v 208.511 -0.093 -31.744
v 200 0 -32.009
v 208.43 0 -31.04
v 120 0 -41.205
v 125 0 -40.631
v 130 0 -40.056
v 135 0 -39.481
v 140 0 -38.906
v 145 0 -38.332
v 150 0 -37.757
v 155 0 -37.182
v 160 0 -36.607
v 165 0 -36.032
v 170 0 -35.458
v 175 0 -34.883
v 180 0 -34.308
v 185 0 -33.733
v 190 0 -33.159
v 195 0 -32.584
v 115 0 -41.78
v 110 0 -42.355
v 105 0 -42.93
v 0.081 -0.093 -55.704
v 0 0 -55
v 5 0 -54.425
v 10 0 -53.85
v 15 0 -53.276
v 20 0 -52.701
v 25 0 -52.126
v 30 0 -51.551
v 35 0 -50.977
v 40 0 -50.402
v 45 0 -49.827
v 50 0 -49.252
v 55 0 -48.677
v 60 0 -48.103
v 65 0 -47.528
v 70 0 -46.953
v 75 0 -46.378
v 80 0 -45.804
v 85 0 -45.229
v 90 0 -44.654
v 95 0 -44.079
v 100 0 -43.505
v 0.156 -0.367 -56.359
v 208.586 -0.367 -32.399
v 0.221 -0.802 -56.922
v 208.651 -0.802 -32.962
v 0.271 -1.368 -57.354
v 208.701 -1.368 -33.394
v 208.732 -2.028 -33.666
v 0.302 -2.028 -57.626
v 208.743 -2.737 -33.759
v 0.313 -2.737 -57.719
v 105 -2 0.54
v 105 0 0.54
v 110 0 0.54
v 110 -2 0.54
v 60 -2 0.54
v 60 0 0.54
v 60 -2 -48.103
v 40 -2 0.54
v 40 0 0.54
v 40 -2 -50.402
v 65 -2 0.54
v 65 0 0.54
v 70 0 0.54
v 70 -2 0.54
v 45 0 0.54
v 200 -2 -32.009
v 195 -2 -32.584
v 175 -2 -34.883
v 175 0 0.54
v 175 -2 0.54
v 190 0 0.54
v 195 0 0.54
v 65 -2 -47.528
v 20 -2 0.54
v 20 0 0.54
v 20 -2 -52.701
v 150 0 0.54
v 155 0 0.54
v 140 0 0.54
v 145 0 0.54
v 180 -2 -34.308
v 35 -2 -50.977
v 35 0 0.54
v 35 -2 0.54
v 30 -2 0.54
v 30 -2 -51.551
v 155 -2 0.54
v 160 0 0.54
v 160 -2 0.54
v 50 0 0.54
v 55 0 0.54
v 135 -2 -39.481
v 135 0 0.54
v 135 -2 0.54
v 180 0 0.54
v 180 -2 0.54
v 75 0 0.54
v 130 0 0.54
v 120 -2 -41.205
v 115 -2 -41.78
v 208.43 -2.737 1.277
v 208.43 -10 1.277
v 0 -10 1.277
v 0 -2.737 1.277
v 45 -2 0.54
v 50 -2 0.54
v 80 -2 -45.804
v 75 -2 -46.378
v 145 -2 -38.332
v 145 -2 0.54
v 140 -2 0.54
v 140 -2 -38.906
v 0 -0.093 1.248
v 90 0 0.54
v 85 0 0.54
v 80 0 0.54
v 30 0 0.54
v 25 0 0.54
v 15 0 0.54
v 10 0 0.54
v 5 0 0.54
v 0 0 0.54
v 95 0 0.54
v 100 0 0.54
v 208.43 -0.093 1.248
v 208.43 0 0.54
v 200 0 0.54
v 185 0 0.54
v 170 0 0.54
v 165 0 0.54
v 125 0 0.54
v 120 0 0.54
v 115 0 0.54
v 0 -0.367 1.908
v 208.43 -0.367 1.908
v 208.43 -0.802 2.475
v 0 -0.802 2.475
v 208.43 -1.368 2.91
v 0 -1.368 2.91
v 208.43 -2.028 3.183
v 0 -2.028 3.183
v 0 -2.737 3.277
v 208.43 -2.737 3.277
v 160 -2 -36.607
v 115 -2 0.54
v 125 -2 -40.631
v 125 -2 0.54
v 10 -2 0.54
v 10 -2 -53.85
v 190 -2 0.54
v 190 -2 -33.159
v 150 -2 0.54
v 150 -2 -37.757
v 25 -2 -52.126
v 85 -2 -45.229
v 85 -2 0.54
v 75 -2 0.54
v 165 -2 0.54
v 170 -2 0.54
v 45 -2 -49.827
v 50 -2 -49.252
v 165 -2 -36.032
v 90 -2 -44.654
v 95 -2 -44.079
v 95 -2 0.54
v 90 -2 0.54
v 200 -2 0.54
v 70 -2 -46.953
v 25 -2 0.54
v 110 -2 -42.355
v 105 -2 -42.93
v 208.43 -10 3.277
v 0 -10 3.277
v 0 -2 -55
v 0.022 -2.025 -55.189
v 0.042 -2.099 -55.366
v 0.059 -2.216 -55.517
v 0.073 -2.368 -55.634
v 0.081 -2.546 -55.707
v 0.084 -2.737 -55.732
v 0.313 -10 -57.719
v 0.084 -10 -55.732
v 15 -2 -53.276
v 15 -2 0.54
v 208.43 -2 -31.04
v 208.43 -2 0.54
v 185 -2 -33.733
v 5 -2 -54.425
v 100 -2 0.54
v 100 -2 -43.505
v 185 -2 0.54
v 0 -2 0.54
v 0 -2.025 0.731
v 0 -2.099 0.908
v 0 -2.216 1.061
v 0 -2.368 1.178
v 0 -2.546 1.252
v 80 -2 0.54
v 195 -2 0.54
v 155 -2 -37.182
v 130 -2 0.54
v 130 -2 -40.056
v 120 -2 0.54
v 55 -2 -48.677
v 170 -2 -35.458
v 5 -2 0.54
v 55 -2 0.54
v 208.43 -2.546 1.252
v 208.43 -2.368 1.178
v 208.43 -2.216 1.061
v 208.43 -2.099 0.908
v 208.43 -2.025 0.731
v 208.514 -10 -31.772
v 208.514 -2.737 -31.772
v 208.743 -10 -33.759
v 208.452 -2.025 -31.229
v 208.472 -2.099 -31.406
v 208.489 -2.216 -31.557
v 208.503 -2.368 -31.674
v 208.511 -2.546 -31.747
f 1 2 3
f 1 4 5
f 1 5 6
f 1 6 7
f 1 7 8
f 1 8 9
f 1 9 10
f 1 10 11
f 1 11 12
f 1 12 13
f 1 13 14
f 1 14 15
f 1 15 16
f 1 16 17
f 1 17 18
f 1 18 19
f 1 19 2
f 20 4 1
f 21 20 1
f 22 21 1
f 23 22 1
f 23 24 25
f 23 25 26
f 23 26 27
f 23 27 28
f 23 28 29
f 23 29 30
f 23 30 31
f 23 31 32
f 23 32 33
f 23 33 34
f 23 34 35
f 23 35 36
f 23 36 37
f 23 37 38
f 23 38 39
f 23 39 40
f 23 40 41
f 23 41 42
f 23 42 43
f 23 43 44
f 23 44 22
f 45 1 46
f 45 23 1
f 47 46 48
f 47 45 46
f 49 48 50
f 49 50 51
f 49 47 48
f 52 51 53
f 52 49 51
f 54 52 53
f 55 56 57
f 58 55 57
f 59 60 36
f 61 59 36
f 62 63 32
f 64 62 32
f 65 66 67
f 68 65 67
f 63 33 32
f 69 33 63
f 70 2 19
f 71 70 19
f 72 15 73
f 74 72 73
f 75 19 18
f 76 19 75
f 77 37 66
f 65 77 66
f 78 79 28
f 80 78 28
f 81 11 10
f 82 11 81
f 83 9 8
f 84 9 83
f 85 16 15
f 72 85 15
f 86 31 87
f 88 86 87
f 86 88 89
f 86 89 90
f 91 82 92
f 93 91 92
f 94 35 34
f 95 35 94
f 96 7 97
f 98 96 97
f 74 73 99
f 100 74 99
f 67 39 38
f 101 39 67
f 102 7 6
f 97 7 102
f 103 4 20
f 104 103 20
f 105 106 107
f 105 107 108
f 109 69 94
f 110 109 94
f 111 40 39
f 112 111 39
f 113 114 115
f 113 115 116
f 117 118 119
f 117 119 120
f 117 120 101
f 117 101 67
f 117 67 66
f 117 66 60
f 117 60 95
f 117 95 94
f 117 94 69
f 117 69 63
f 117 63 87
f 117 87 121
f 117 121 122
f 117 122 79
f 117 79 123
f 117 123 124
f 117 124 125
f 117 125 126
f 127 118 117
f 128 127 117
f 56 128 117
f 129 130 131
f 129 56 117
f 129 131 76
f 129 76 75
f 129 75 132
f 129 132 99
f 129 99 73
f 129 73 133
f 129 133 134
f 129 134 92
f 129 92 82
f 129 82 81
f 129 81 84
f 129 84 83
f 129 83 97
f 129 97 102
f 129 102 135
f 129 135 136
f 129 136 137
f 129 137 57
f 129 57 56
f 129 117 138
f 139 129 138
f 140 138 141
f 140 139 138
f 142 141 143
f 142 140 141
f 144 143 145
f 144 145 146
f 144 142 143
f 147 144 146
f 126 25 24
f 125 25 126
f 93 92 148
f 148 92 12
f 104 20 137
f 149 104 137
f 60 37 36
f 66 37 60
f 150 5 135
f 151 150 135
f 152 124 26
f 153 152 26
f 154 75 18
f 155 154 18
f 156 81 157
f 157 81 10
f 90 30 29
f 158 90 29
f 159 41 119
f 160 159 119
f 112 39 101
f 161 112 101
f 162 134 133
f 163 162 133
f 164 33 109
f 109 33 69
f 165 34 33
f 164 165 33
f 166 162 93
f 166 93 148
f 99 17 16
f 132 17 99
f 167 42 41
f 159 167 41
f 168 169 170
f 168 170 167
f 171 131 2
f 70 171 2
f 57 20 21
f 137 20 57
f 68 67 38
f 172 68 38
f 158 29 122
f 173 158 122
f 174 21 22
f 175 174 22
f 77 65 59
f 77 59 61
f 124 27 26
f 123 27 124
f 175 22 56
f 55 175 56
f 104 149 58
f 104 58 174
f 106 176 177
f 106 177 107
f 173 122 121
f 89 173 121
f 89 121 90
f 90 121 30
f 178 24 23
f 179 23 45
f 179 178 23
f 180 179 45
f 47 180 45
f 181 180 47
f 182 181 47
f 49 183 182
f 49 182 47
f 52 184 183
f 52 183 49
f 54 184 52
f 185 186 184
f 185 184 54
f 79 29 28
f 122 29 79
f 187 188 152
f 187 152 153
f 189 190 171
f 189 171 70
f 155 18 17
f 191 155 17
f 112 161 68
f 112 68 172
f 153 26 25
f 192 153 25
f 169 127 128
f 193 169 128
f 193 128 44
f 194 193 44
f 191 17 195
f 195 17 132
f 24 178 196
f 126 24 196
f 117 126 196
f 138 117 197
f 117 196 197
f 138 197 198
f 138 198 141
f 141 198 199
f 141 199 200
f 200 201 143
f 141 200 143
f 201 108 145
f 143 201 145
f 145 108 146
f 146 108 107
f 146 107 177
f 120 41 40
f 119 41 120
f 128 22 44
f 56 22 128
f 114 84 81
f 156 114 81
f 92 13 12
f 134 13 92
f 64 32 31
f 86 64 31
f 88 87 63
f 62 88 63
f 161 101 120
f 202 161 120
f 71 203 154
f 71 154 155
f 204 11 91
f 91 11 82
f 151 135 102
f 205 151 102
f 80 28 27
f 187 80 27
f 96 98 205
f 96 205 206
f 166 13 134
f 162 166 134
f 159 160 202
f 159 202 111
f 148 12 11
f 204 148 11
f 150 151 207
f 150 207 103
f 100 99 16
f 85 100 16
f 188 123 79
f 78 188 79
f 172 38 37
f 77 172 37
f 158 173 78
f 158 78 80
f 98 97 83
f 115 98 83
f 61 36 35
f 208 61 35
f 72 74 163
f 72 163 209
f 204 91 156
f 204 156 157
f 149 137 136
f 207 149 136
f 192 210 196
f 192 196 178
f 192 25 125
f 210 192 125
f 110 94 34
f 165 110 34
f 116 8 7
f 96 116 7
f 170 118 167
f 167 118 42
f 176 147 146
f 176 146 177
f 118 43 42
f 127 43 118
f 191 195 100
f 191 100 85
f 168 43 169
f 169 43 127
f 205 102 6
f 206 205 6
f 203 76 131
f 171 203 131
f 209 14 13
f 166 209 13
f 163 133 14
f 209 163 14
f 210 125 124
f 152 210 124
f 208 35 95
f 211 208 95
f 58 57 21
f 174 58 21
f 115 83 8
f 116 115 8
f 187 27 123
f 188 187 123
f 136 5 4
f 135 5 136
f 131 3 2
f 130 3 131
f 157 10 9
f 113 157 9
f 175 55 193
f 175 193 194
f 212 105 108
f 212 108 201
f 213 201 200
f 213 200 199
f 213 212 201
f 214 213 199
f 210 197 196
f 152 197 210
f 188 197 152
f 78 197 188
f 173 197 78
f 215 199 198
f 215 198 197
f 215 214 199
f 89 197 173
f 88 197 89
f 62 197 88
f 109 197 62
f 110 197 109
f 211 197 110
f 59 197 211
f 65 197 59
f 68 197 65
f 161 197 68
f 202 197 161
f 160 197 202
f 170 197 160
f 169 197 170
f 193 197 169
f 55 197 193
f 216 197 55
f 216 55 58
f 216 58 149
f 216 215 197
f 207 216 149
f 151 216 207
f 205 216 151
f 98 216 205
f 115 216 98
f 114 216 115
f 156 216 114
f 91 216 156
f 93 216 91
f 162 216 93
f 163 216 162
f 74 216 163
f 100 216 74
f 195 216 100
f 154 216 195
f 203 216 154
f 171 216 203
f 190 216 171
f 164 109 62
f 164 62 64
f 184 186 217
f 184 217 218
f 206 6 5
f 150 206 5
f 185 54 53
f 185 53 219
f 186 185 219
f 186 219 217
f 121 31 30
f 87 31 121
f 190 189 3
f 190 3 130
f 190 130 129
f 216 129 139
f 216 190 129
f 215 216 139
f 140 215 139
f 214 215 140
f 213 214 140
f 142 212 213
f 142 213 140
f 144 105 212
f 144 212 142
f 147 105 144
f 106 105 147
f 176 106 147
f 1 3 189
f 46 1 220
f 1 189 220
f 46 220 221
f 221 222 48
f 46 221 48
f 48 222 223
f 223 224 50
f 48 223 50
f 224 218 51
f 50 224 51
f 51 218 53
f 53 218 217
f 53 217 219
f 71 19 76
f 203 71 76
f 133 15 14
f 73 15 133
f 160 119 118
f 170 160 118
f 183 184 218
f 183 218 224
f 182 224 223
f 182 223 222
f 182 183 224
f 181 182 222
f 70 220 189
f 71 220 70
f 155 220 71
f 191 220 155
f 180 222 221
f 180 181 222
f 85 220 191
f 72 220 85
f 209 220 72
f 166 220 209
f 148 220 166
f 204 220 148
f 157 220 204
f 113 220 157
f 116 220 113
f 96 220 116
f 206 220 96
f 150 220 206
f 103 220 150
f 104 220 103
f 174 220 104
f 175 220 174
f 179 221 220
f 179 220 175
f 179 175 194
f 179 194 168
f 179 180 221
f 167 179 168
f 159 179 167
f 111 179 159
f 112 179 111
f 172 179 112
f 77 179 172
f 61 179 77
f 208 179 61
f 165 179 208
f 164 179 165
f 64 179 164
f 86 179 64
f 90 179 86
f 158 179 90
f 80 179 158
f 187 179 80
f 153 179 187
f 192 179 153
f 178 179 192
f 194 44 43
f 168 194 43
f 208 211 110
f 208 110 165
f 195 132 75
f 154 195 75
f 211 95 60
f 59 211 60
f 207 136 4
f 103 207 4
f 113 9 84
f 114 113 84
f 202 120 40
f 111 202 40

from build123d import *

# Parameters (mm, degrees)
BASE_FLANGE1_DEPTH = 2
EDGE_FLANGE1_DEPTH = 209.802637019
EDGE_FLANGE2_DEPTH = 208.43
CUT_EXTRUDE1_DEPTH = 10
CUT_EXTRUDE2_DEPTH = 10
CUT_EXTRUDE3_DEPTH = 10
CUT_EXTRUDE4_DEPTH = 10


# Sheet-metal steps are written as plain solids
with BuildPart() as part:
    # Sketch1 → Base-Flange1 (new body)
    with BuildSketch(Plane(origin=(0, 0, 0), x_dir=(1, 0, 0), z_dir=(0, 1, 0))):
        Polygon((0, 0), (208.43, 0), (208.43, 31.04), (0, 55), align=None)
    extrude(amount=-BASE_FLANGE1_DEPTH)

    # Edge-Flange1 section (across the edge) → Edge-Flange1 (add)
    with BuildSketch(Plane(origin=(0.084121612, -2, -55.731780783), x_dir=(-0.1142025683779395, -3.4914813388431334e-15, 0.9934574844329687), z_dir=(0.9934574844329687, 0, 0.1142025683779395))):
        with BuildLine():
            Line((-2, 0.7366), (-2, 8))
            Line((-2, 8), (0, 8))
            Line((0, 8), (0, 0.7366))
            ThreePointArc((0, 0.7366), (0.215745145, 0.215745145), (0.7366, 0))
            Line((0.7366, 0), (0.7366, -2))
            ThreePointArc((0.7366, -2), (-1.198468417, -1.198468417), (-2, 0.7366))
        make_face()
    extrude(amount=EDGE_FLANGE1_DEPTH)

    # Edge-Flange2 section (across the edge) → Edge-Flange2 (add)
    with BuildSketch(Plane(origin=(208.43, -2, 1.2766), x_dir=(0, 0, -1), z_dir=(-1, 0, 0))):
        with BuildLine():
            Line((-2, 0.7366), (-2, 8))
            Line((-2, 8), (0, 8))
            Line((0, 8), (0, 0.7366))
            ThreePointArc((0, 0.7366), (0.215745145, 0.215745145), (0.7366, 0))
            Line((0.7366, 0), (1.2766, 0))
            Line((1.2766, 0), (1.2766, -2))
            Line((1.2766, -2), (0.7366, -2))
            ThreePointArc((0.7366, -2), (-1.198468417, -1.198468417), (-2, 0.7366))
        make_face()
    extrude(amount=EDGE_FLANGE2_DEPTH)

    # Sketch12 → Cut-Extrude1 (cut)
    with BuildSketch(Plane(origin=(0, 0, 0), x_dir=(1, 0, 0), z_dir=(0, 1, 0))):
        Polygon((5, 54.425226695), (5, -0.54), (10, -0.54), (10, 53.85045339), align=None)
    extrude(amount=-CUT_EXTRUDE1_DEPTH, mode=Mode.SUBTRACT)

    # Sketch13 → Cut-Extrude2 (cut)
    with BuildSketch(Plane(origin=(0, 0, 0), x_dir=(1, 0, 0), z_dir=(0, 1, 0))):
        Polygon((15, 53.275680084), (15, -0.54), (20, -0.54), (20, 52.700906779), align=None)
        Polygon((25, 52.126133474), (25, -0.54), (30, -0.54), (30, 51.551360169), align=None)
        Polygon((35, 50.976586864), (35, -0.54), (40, -0.54), (40, 50.401813559), align=None)
        Polygon((45, 49.827040253), (45, -0.54), (50, -0.54), (50, 49.252266948), align=None)
    extrude(amount=-CUT_EXTRUDE2_DEPTH, mode=Mode.SUBTRACT)

    # Sketch14 → Cut-Extrude3 (cut)
    with BuildSketch(Plane(origin=(0, 0, 0), x_dir=(1, 0, 0), z_dir=(0, 1, 0))):
        Polygon((55, 48.677493643), (55, -0.54), (60, -0.54), (60, 48.102720338), align=None)
        Polygon((65, 47.527947033), (65, -0.54), (70, -0.54), (70, 46.953173727), align=None)
        Polygon((75, 46.378400422), (75, -0.54), (80, -0.54), (80, 45.803627117), align=None)
        Polygon((85, 45.228853812), (85, -0.54), (90, -0.54), (90, 44.654080507), align=None)
        Polygon((95, 44.079307201), (95, -0.54), (100, -0.54), (100, 43.504533896), align=None)
        Polygon((105, 42.929760591), (105, -0.54), (110, -0.54), (110, 42.354987286), align=None)
        Polygon((115, 41.780213981), (115, -0.54), (120, -0.54), (120, 41.205440676), align=None)
    extrude(amount=-CUT_EXTRUDE3_DEPTH, mode=Mode.SUBTRACT)

    # Sketch15 → Cut-Extrude4 (cut)
    with BuildSketch(Plane(origin=(0, 0, 0), x_dir=(1, 0, 0), z_dir=(0, 1, 0))):
        Polygon((125, 40.63066737), (125, -0.54), (130, -0.54), (130, 40.055894065), align=None)
        Polygon((135, 39.48112076), (135, -0.54), (140, -0.54), (140, 38.906347455), align=None)
        Polygon((145, 38.33157415), (145, -0.54), (150, -0.54), (150, 37.756800844), align=None)
        Polygon((155, 37.182027539), (155, -0.54), (160, -0.54), (160, 36.607254234), align=None)
        Polygon((165, 36.032480929), (165, -0.54), (170, -0.54), (170, 35.457707624), align=None)
        Polygon((175, 34.882934318), (175, -0.54), (180, -0.54), (180, 34.308161013), align=None)
        Polygon((185, 33.733387708), (185, -0.54), (190, -0.54), (190, 33.158614403), align=None)
        Polygon((195, 32.583841098), (195, -0.54), (200, -0.54), (200, 32.009067793), align=None)
    extrude(amount=-CUT_EXTRUDE4_DEPTH, mode=Mode.SUBTRACT)


solid = part.part
